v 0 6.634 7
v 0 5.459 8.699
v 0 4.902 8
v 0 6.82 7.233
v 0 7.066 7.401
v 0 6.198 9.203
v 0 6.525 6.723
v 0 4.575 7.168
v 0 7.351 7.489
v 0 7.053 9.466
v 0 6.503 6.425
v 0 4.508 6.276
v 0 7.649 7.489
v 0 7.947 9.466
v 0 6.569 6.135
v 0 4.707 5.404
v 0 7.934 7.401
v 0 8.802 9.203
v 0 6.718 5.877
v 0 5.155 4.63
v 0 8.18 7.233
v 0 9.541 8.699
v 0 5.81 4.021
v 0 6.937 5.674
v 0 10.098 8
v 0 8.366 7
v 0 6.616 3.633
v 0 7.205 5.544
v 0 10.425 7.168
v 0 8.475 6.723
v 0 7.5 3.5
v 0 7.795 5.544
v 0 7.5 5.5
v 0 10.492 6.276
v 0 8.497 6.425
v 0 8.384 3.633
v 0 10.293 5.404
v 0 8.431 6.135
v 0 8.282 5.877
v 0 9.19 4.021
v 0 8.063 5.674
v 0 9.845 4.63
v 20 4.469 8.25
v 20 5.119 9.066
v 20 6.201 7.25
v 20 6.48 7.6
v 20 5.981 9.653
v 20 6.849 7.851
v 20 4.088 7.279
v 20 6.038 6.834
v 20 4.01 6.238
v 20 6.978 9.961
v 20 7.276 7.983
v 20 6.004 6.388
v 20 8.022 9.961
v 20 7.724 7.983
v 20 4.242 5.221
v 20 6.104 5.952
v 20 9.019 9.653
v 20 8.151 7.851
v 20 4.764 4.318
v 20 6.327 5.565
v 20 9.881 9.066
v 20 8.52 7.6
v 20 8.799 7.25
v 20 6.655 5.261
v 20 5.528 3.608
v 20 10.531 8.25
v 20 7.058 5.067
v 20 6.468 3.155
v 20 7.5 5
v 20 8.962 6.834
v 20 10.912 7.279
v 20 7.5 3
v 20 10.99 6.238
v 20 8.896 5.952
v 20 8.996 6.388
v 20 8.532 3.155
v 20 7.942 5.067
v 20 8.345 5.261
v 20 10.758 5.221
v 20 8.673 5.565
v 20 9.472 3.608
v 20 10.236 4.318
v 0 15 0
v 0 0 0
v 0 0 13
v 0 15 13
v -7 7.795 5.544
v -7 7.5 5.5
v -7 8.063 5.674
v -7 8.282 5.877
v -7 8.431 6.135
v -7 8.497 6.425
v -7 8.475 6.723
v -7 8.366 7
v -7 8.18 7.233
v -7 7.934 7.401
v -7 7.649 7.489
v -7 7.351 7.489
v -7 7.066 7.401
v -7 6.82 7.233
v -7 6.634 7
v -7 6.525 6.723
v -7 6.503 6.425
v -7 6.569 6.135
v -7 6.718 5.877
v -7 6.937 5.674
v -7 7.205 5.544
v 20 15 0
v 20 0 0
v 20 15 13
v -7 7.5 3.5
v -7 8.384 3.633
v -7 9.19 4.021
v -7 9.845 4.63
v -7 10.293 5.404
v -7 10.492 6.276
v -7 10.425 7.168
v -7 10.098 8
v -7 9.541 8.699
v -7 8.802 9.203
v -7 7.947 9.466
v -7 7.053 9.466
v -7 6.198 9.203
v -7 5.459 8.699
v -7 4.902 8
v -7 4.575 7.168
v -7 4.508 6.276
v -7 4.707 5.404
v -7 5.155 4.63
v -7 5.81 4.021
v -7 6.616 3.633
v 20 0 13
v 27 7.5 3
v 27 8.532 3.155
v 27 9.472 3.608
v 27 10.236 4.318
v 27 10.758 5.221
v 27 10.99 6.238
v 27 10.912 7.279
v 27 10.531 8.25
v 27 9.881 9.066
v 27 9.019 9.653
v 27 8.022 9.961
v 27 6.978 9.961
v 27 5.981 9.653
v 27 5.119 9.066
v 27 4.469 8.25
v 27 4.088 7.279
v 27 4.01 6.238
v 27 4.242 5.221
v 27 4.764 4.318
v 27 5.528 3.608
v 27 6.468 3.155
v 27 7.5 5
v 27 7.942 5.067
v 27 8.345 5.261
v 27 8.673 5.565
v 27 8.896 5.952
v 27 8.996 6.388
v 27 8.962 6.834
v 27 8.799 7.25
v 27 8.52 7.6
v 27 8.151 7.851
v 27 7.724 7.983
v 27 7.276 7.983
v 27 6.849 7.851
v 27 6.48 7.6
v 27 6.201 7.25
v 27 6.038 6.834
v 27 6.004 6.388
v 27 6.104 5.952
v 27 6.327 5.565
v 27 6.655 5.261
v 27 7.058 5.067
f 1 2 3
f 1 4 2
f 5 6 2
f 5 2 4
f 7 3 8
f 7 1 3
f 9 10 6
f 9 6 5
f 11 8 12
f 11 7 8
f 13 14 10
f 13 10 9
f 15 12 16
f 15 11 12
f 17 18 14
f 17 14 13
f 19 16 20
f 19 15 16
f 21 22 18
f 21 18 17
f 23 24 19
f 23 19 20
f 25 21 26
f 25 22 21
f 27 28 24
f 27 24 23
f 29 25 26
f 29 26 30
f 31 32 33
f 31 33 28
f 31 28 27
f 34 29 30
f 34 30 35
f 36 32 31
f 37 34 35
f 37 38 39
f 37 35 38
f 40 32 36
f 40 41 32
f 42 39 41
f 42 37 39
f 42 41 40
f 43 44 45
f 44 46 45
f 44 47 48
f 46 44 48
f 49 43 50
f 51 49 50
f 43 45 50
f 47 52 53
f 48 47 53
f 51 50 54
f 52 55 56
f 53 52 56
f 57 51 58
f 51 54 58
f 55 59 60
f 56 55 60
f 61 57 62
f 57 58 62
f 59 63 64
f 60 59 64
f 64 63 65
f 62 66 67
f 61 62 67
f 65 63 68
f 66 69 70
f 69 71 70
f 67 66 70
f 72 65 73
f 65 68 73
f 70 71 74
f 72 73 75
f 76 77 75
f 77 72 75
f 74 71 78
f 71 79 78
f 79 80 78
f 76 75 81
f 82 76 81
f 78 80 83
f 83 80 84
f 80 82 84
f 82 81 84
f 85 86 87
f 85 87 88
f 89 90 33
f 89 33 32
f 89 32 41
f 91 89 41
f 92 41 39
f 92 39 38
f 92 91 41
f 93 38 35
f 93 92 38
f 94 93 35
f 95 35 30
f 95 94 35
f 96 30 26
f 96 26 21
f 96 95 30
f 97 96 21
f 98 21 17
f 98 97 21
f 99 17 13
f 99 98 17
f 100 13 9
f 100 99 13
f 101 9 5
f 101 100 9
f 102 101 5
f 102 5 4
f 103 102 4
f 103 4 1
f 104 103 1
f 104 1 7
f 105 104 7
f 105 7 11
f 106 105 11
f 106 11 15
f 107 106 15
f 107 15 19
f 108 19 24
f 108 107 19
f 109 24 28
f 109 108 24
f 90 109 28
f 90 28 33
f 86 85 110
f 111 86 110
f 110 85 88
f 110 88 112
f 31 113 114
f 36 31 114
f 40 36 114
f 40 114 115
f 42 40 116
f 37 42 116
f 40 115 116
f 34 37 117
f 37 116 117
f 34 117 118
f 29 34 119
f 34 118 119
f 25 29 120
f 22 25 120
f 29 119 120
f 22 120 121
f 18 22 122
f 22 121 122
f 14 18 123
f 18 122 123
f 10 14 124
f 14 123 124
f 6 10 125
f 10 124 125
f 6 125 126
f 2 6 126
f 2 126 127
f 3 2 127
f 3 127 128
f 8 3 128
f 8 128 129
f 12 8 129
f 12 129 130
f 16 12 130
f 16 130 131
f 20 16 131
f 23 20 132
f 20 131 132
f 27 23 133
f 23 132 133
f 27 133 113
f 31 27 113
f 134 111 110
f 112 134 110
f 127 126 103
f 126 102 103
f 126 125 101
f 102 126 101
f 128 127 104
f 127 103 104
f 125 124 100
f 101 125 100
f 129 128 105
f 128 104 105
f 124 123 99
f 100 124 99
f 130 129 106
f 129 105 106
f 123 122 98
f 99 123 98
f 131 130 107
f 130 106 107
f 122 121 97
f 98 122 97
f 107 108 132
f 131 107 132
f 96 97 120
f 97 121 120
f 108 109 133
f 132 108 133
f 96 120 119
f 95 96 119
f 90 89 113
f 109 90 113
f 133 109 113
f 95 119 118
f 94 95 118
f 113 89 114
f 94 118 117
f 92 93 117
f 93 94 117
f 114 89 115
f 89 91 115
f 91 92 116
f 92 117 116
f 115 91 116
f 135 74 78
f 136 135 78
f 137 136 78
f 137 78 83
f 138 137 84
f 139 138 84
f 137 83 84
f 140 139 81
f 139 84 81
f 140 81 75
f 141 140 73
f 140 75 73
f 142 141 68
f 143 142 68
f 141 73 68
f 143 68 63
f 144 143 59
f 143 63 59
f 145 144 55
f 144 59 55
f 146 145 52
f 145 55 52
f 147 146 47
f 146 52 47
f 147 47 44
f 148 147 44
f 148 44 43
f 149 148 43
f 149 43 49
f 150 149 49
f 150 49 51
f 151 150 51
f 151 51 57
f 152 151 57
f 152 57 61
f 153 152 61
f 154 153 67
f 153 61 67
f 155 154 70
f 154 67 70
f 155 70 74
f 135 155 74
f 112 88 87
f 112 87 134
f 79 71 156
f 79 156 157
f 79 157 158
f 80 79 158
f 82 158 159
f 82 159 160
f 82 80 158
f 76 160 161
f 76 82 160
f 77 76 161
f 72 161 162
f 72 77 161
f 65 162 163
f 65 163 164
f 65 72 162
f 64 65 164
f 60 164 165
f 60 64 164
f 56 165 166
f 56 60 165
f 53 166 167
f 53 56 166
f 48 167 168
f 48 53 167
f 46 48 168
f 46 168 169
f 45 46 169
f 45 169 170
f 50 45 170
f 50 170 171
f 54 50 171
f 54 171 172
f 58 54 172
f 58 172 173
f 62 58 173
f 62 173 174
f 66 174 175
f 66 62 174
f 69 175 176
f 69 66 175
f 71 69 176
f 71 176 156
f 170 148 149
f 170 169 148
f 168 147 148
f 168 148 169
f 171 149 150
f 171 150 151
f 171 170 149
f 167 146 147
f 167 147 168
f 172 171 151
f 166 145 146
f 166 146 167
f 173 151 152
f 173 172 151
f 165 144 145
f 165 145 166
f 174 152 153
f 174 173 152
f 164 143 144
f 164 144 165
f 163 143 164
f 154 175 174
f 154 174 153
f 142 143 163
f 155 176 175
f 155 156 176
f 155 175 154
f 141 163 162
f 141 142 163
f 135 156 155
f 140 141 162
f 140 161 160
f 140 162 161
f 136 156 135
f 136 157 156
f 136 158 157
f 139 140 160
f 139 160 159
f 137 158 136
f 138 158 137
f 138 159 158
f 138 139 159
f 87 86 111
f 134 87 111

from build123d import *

# Parameters (mm, degrees)
BOX_W         = 20
BOX_H         = 15
BOX_DEPTH     = 13
TUBE_R        = 3
TUBE_R_2      = 1
TUBE_DEPTH    = 7
TUBE001_R     = 3.5
TUBE001_R_2   = 1.5
TUBE001_DEPTH = 7


with BuildPart() as cube:
    # Box → Box (new body)
    with BuildSketch(Plane.XY):
        with Locations((10, 7.5)):
            Rectangle(BOX_W, BOX_H)
    extrude(amount=BOX_DEPTH)


with BuildPart() as tube:
    # Tube → Tube (new body)
    with BuildSketch(Plane(origin=(-7, 7.5, 6.5), x_dir=(0, 0, -1), z_dir=(1, 0, 0))):
        Circle(TUBE_R)
        Circle(TUBE_R_2, mode=Mode.SUBTRACT)
    extrude(amount=TUBE_DEPTH)


with BuildPart() as tube001:
    # Tube001 → Tube001 (new body)
    with BuildSketch(Plane(origin=(20, 7.5, 6.5), x_dir=(0, 0, -1), z_dir=(1, 0, 0))):
        Circle(TUBE001_R)
        Circle(TUBE001_R_2, mode=Mode.SUBTRACT)
    extrude(amount=TUBE001_DEPTH)


solid = Compound([cube.part, tube.part, tube001.part])
